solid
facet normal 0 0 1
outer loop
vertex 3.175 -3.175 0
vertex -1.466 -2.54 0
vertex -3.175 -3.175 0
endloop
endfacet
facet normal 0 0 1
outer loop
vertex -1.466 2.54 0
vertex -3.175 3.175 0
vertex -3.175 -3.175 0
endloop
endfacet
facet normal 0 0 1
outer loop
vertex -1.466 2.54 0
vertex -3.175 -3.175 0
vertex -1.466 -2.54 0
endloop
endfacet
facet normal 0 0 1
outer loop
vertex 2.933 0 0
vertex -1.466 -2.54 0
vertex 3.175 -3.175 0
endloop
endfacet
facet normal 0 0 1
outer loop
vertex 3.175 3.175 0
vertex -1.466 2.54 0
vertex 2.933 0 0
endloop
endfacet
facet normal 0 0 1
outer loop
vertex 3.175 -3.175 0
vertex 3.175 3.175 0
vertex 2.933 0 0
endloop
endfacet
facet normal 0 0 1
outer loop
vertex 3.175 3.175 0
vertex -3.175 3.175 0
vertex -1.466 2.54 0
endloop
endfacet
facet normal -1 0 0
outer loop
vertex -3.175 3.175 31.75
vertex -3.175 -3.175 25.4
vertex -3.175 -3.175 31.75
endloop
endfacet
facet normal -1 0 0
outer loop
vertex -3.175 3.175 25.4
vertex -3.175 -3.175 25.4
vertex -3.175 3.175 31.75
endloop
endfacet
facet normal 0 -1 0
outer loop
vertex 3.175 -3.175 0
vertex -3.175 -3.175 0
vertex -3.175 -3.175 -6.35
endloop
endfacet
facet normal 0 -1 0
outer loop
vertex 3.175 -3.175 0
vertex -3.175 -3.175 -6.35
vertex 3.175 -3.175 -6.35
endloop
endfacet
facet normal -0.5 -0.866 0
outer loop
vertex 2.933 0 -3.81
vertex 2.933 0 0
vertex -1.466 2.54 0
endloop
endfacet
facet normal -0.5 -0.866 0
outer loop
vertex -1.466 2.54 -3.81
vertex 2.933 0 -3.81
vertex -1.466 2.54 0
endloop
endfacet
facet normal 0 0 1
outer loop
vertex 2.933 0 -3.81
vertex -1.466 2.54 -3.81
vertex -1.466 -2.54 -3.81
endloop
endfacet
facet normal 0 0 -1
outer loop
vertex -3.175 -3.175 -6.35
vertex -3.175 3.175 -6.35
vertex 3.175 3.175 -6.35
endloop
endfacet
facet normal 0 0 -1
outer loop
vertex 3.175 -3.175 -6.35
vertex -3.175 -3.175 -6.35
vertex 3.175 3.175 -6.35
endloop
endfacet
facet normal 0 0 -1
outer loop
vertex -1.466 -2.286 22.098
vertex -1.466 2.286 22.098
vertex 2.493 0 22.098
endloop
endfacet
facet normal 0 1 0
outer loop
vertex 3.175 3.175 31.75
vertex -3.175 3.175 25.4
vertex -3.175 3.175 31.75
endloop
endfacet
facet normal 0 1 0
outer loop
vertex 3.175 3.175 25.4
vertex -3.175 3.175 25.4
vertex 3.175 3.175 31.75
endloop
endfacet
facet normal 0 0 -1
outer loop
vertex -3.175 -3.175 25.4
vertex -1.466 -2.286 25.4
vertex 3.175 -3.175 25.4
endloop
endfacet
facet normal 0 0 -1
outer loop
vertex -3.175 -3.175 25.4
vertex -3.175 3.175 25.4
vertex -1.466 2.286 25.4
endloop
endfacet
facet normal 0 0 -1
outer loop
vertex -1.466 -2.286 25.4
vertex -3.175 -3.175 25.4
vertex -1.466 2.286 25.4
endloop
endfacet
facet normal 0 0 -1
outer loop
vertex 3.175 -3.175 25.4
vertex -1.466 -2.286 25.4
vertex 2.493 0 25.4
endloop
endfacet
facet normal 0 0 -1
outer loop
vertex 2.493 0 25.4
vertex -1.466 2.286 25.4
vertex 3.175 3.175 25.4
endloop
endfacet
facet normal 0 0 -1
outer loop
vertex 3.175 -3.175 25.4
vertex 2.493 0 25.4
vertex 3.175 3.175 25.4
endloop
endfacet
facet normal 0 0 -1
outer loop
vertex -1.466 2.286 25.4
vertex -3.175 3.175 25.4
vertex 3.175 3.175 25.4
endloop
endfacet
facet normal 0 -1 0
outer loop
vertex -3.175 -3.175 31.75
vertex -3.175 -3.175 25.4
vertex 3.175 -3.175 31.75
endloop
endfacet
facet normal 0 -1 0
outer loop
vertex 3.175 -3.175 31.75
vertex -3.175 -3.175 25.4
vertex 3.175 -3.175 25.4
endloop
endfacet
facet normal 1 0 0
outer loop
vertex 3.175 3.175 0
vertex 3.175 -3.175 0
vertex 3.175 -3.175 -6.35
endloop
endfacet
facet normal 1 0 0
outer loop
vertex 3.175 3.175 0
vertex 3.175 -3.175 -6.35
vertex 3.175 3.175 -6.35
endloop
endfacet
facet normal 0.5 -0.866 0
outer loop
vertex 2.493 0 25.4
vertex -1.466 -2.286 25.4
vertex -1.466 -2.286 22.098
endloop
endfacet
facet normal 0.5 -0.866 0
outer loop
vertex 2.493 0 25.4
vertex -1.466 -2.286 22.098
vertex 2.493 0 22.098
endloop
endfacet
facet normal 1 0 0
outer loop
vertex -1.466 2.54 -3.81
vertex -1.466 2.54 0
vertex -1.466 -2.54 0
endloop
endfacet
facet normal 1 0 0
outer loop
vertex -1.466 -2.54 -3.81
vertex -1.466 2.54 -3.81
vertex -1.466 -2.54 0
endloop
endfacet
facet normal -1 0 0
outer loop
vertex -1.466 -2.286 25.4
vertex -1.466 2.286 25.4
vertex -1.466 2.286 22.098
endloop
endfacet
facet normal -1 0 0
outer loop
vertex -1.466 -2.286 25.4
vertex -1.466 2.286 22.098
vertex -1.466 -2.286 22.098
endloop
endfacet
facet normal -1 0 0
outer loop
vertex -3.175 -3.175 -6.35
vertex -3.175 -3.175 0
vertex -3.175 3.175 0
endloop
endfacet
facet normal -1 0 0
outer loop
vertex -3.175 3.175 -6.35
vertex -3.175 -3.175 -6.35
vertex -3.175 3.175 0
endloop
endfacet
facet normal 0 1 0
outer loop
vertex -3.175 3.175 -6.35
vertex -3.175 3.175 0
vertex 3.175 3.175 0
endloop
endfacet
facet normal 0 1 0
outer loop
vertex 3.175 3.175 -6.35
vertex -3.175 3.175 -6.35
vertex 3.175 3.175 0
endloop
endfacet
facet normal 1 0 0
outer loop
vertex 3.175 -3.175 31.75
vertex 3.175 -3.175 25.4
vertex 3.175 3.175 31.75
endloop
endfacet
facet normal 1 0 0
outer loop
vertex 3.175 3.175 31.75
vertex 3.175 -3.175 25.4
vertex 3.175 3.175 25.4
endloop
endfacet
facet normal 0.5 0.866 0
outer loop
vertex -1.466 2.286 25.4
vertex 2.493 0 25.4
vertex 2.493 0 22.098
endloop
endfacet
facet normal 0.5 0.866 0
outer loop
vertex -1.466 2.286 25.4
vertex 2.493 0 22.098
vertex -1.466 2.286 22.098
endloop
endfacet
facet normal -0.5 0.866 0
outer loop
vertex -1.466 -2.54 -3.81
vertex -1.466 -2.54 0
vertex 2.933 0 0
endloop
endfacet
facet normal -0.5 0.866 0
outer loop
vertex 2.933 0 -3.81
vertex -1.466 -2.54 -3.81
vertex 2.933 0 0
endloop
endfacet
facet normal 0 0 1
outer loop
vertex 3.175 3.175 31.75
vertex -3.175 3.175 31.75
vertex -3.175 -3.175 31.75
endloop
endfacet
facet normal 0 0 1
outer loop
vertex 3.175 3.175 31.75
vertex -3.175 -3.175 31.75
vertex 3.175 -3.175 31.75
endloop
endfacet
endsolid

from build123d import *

# Parameters (mm, degrees)
F0_W     = 6.35
F0_H     = 6.35
F1_DEPTH = 6.35
F2_DEPTH = 3.81
F4_W     = 6.35
F4_H     = 6.35
F5_DEPTH = 6.35
F6_DEPTH = 3.302


with BuildPart() as f1:
    # F0 (on Top) → F1 (new body)
    with BuildSketch(Plane.XY):
        Rectangle(F0_W, F0_H)
        Polygon((2.932939, 0), (-1.46647, -2.54), (-1.46647, 2.54), align=None, mode=Mode.SUBTRACT)
        Polygon((-1.46647, 2.54), (-1.46647, -2.54), (2.932939, 0), align=None)
    extrude(amount=-F1_DEPTH)

    # F0 (on Top) → F2 (cut)
    with BuildSketch(Plane.XY):
        Polygon((-1.46647, 2.54), (-1.46647, -2.54), (2.932939, 0), align=None)
    extrude(amount=-F2_DEPTH, mode=Mode.SUBTRACT)


with BuildPart() as f5:
    # F4 (on offset) → F5 (new body)
    with BuildSketch(Plane.XY.offset(25.4)):
        Rectangle(F4_W, F4_H)
        Polygon((-1.46647, -2.286), (-1.46647, 0), (-1.46647, 2.286), (2.492998, 0), align=None, mode=Mode.SUBTRACT)
        Polygon((-1.46647, 2.286), (-1.46647, 0), (-1.46647, -2.286), (2.492998, 0), align=None)
    extrude(amount=F5_DEPTH)

    # F4 (on offset) → F6 (join)
    with BuildSketch(Plane.XY.offset(25.4)):
        Polygon((-1.46647, 2.286), (-1.46647, 0), (-1.46647, -2.286), (2.492998, 0), align=None)
    extrude(amount=-F6_DEPTH)


solid = Compound([f1.part, f5.part])
